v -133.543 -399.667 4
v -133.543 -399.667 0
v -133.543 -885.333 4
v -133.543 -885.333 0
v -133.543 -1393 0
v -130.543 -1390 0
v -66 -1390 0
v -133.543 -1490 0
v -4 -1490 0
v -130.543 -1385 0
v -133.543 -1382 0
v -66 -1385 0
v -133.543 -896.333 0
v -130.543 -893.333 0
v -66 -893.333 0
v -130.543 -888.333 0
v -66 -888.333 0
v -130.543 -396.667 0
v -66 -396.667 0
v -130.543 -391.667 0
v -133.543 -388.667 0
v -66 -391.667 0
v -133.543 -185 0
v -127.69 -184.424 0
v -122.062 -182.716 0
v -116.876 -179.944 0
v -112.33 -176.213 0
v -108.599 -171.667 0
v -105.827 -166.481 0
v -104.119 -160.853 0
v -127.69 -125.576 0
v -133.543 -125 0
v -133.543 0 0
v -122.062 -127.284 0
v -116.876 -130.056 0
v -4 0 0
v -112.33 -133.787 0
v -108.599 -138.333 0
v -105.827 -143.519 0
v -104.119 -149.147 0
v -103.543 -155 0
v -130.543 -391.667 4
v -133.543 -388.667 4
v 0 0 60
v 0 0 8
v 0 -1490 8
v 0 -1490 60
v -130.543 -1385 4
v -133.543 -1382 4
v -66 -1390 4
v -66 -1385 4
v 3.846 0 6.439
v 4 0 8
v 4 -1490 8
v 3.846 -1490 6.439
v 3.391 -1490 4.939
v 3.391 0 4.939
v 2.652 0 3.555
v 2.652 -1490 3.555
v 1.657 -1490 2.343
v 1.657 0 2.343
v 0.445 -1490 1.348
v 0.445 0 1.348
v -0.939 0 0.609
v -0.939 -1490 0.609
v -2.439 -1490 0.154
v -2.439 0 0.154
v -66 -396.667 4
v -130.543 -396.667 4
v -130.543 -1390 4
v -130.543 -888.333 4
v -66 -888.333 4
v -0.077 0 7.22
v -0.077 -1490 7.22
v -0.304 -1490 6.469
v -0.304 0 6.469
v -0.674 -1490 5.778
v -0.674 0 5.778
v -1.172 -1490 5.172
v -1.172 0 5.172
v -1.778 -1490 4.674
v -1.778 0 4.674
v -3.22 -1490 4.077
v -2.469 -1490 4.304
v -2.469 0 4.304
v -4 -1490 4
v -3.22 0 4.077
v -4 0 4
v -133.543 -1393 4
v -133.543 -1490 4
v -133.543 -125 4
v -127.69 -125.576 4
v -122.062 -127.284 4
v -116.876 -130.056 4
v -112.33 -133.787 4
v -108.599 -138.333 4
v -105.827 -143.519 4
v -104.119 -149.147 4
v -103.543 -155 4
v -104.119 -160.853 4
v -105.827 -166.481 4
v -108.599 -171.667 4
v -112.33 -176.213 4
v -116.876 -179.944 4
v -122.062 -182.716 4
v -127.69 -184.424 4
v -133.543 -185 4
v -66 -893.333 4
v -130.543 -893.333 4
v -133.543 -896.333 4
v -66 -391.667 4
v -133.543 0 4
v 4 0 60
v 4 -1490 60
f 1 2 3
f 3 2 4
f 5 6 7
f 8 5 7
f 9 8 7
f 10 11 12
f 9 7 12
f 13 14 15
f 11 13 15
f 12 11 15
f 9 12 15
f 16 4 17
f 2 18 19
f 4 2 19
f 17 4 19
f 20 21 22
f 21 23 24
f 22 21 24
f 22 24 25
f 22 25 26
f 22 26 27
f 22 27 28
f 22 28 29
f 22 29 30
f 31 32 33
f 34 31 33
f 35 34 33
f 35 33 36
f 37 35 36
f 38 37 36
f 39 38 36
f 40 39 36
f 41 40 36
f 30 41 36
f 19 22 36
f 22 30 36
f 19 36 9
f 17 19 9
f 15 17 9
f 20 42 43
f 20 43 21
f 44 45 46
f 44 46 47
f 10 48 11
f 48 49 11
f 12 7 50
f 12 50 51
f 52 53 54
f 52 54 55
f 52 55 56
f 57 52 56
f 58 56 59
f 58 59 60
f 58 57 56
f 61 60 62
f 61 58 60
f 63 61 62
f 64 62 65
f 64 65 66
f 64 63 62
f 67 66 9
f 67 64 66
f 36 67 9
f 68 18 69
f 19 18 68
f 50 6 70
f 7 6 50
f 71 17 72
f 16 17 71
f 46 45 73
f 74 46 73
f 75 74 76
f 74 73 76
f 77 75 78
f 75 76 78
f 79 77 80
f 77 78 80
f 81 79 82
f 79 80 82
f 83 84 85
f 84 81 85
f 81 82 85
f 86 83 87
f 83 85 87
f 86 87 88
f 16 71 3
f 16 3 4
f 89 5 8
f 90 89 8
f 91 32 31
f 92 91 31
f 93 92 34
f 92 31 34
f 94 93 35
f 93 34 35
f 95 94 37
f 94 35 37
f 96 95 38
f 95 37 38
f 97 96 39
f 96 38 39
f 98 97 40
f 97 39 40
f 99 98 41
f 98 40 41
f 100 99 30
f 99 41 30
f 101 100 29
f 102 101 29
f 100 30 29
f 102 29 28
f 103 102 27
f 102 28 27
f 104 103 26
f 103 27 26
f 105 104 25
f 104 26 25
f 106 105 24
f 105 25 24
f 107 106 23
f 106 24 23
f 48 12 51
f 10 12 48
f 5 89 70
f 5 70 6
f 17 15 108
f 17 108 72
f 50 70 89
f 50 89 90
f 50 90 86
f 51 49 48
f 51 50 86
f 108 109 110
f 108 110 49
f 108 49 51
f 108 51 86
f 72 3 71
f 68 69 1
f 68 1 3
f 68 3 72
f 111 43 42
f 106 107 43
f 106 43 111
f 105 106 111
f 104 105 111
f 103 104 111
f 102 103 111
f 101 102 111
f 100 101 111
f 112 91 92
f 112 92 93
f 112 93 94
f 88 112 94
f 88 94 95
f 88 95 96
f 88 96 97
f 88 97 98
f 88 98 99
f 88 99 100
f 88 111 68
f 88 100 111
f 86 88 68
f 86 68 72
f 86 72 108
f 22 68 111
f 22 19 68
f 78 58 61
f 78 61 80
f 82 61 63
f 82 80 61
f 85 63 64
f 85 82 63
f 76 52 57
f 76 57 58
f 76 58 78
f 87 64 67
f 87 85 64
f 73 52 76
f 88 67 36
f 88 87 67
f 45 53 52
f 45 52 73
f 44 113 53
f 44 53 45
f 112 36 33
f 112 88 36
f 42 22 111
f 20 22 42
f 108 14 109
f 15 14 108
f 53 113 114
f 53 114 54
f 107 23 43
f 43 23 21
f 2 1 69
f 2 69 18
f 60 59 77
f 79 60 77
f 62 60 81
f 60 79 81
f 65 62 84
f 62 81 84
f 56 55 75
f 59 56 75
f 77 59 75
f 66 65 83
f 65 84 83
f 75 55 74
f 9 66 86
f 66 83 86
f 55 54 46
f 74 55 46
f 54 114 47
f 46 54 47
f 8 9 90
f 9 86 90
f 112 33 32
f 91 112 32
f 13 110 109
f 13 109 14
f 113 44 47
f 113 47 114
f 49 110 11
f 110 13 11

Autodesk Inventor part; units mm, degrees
ref_plane "YZ Plane" through (0, 0, 0) normal (1, 0, 0) x (0, 1, 0)
ref_plane "XZ Plane" through (0, 0, 0) normal (0, 1, 0) x (-1, 0, 0)
ref_plane "XY Plane" through (0, 0, 0) normal (0, 0, 1) x (1, 0, 0)
sketch "Sketch1" plane through (0, 0, 0) normal (0, 0, 1) x (1, 0, 0)
  line L0 (0, 0) -> (-133.543, 0)
  line L1 (-133.543, 0) -> (-133.543, -1490)
  line L2 (-133.543, -1490) -> (0, -1490)
  line L3 (0, -1490) -> (0, 0)
  line L4 (-133.543, -1390) -> (-66, -1390)
  line L5 (-66, -1390) -> (-66, -1385)
  line L6 (-66, -1385) -> (-133.543, -1385)
  line L7 (-133.543, -1385) -> (-133.543, -1390)
  line L8 (-133.543, -893.3333) -> (-66, -893.3333)
  line L9 (-66, -893.3333) -> (-66, -888.3333)
  line L10 (-66, -888.3333) -> (-133.543, -888.3333)
  line L11 (-133.543, -888.3333) -> (-133.543, -893.3333)
  line L12 (-133.543, -396.6667) -> (-66, -396.6667)
  line L13 (-66, -396.6667) -> (-66, -391.6667)
  line L14 (-66, -391.6667) -> (-133.543, -391.6667)
  line L15 (-133.543, -391.6667) -> (-133.543, -396.6667)
  circle A0 centre (-133.543, -155) radius 30
  point P0 (-133.543, -391.6667)
  point P1 (-133.543, -125)
  point P2 (-133.543, -185)
  dimension "d0" = 1490
  dimension "d1" = 133.543
  dimension "d2" = 5
  dimension "d4" = 100
  dimension "d7" = 496.6667
  dimension "d23" = 66
  dimension "d28" = 60
  dimension "d29" = 1335
extrude "Plate1" add sketch "Sketch1" along normal blind 4 contours L3 L2 L1 L4 L5 L6 L8 L9 L10 L12 L13 L14 A0 L0
sketch "Sketch2" plane through (4, 0, 0) normal (-1, 0, 0) x (0, -1, 0)
  line L0 (1490, 0) -> (0, 0)
  line L1 (0, 0) -> (0, 60)
  line L2 (0, 60) -> (1490, 60)
  line L3 (1490, 60) -> (1490, 0)
edge flange "Flange1" height 60 angle 90 thickness 4 bend radius 4 thickness toward (-1, 0, 0) relief tear relief width 4 relief depth 2 edges at (0, -745, 4) wall of the first edge with corners at (4, -1490, 0) (4, 0, 0) (4, 0, 60) (4, -1490, 60)
bend "Bend1"
corner "Corner1"
chamfer "Corner Chamfer1" distance 3 angle 45 6 edges at (-133.543, -1390, 2) (-133.543, -1385, 2) (-133.543, -893.3333, 2) (-133.543, -888.3333, 2) (-133.543, -391.6667, 2) (-133.543, -396.6667, 2)
equation "\"d0\" = Стрингер_длина"
equation "\"d1\" = стрингер_глубина_6"
equation "\"d2\" = паз_под_стрингер_толщина"
equation "\"d7\" = 0.333333 * Стрингер_длина"
equation "\"d23\" = паз_под_стрингер_глубина - Thickness"
equation "\"d28\" = 2 * радиус_выреза_под_сварку"
equation "\"d12\" = Thickness"
equation "\"d13\" = BendReliefWidth"
equation "\"d14\" = BendReliefDepth"
equation "\"d15\" = MinimumRemnant"
equation "\"d16\" = TransitionRadius"
equation "\"d17\" = ребро_усилителей"
equation "\"d19\" = BendRadius"
equation "\"d20\" = CornerReliefSize"
equation "\"d21\" = GapSize"
equation "\"d22\" = JacobiRadiusSize"
equation "\"BendRadius\" = Thickness"
equation "\"BendReliefWidth\" = Thickness"
equation "\"BendReliefDepth\" = 0.5 * Thickness"
equation "\"CornerReliefSize\" = 4 * Thickness"
equation "\"MinimumRemnant\" = 2 * Thickness"
equation "\"TransitionRadius\" = BendRadius"
equation "\"JacobiRadiusSize\" = BendRadius"
equation "\"GapSize\" = Thickness"
equation "\"Стрингер_длина\" = 1490"
equation "\"стрингер_глубина_6\" = 133.543003"
equation "\"паз_под_стрингер_толщина\" = 5"
equation "\"паз_под_стрингер_глубина\" = 70"
equation "\"Thickness\" = 4"
equation "\"радиус_выреза_под_сварку\" = 30"
equation "\"ребро_усилителей\" = 60"
properties part number "GBK 1214 stringer 6" material "Steel"
